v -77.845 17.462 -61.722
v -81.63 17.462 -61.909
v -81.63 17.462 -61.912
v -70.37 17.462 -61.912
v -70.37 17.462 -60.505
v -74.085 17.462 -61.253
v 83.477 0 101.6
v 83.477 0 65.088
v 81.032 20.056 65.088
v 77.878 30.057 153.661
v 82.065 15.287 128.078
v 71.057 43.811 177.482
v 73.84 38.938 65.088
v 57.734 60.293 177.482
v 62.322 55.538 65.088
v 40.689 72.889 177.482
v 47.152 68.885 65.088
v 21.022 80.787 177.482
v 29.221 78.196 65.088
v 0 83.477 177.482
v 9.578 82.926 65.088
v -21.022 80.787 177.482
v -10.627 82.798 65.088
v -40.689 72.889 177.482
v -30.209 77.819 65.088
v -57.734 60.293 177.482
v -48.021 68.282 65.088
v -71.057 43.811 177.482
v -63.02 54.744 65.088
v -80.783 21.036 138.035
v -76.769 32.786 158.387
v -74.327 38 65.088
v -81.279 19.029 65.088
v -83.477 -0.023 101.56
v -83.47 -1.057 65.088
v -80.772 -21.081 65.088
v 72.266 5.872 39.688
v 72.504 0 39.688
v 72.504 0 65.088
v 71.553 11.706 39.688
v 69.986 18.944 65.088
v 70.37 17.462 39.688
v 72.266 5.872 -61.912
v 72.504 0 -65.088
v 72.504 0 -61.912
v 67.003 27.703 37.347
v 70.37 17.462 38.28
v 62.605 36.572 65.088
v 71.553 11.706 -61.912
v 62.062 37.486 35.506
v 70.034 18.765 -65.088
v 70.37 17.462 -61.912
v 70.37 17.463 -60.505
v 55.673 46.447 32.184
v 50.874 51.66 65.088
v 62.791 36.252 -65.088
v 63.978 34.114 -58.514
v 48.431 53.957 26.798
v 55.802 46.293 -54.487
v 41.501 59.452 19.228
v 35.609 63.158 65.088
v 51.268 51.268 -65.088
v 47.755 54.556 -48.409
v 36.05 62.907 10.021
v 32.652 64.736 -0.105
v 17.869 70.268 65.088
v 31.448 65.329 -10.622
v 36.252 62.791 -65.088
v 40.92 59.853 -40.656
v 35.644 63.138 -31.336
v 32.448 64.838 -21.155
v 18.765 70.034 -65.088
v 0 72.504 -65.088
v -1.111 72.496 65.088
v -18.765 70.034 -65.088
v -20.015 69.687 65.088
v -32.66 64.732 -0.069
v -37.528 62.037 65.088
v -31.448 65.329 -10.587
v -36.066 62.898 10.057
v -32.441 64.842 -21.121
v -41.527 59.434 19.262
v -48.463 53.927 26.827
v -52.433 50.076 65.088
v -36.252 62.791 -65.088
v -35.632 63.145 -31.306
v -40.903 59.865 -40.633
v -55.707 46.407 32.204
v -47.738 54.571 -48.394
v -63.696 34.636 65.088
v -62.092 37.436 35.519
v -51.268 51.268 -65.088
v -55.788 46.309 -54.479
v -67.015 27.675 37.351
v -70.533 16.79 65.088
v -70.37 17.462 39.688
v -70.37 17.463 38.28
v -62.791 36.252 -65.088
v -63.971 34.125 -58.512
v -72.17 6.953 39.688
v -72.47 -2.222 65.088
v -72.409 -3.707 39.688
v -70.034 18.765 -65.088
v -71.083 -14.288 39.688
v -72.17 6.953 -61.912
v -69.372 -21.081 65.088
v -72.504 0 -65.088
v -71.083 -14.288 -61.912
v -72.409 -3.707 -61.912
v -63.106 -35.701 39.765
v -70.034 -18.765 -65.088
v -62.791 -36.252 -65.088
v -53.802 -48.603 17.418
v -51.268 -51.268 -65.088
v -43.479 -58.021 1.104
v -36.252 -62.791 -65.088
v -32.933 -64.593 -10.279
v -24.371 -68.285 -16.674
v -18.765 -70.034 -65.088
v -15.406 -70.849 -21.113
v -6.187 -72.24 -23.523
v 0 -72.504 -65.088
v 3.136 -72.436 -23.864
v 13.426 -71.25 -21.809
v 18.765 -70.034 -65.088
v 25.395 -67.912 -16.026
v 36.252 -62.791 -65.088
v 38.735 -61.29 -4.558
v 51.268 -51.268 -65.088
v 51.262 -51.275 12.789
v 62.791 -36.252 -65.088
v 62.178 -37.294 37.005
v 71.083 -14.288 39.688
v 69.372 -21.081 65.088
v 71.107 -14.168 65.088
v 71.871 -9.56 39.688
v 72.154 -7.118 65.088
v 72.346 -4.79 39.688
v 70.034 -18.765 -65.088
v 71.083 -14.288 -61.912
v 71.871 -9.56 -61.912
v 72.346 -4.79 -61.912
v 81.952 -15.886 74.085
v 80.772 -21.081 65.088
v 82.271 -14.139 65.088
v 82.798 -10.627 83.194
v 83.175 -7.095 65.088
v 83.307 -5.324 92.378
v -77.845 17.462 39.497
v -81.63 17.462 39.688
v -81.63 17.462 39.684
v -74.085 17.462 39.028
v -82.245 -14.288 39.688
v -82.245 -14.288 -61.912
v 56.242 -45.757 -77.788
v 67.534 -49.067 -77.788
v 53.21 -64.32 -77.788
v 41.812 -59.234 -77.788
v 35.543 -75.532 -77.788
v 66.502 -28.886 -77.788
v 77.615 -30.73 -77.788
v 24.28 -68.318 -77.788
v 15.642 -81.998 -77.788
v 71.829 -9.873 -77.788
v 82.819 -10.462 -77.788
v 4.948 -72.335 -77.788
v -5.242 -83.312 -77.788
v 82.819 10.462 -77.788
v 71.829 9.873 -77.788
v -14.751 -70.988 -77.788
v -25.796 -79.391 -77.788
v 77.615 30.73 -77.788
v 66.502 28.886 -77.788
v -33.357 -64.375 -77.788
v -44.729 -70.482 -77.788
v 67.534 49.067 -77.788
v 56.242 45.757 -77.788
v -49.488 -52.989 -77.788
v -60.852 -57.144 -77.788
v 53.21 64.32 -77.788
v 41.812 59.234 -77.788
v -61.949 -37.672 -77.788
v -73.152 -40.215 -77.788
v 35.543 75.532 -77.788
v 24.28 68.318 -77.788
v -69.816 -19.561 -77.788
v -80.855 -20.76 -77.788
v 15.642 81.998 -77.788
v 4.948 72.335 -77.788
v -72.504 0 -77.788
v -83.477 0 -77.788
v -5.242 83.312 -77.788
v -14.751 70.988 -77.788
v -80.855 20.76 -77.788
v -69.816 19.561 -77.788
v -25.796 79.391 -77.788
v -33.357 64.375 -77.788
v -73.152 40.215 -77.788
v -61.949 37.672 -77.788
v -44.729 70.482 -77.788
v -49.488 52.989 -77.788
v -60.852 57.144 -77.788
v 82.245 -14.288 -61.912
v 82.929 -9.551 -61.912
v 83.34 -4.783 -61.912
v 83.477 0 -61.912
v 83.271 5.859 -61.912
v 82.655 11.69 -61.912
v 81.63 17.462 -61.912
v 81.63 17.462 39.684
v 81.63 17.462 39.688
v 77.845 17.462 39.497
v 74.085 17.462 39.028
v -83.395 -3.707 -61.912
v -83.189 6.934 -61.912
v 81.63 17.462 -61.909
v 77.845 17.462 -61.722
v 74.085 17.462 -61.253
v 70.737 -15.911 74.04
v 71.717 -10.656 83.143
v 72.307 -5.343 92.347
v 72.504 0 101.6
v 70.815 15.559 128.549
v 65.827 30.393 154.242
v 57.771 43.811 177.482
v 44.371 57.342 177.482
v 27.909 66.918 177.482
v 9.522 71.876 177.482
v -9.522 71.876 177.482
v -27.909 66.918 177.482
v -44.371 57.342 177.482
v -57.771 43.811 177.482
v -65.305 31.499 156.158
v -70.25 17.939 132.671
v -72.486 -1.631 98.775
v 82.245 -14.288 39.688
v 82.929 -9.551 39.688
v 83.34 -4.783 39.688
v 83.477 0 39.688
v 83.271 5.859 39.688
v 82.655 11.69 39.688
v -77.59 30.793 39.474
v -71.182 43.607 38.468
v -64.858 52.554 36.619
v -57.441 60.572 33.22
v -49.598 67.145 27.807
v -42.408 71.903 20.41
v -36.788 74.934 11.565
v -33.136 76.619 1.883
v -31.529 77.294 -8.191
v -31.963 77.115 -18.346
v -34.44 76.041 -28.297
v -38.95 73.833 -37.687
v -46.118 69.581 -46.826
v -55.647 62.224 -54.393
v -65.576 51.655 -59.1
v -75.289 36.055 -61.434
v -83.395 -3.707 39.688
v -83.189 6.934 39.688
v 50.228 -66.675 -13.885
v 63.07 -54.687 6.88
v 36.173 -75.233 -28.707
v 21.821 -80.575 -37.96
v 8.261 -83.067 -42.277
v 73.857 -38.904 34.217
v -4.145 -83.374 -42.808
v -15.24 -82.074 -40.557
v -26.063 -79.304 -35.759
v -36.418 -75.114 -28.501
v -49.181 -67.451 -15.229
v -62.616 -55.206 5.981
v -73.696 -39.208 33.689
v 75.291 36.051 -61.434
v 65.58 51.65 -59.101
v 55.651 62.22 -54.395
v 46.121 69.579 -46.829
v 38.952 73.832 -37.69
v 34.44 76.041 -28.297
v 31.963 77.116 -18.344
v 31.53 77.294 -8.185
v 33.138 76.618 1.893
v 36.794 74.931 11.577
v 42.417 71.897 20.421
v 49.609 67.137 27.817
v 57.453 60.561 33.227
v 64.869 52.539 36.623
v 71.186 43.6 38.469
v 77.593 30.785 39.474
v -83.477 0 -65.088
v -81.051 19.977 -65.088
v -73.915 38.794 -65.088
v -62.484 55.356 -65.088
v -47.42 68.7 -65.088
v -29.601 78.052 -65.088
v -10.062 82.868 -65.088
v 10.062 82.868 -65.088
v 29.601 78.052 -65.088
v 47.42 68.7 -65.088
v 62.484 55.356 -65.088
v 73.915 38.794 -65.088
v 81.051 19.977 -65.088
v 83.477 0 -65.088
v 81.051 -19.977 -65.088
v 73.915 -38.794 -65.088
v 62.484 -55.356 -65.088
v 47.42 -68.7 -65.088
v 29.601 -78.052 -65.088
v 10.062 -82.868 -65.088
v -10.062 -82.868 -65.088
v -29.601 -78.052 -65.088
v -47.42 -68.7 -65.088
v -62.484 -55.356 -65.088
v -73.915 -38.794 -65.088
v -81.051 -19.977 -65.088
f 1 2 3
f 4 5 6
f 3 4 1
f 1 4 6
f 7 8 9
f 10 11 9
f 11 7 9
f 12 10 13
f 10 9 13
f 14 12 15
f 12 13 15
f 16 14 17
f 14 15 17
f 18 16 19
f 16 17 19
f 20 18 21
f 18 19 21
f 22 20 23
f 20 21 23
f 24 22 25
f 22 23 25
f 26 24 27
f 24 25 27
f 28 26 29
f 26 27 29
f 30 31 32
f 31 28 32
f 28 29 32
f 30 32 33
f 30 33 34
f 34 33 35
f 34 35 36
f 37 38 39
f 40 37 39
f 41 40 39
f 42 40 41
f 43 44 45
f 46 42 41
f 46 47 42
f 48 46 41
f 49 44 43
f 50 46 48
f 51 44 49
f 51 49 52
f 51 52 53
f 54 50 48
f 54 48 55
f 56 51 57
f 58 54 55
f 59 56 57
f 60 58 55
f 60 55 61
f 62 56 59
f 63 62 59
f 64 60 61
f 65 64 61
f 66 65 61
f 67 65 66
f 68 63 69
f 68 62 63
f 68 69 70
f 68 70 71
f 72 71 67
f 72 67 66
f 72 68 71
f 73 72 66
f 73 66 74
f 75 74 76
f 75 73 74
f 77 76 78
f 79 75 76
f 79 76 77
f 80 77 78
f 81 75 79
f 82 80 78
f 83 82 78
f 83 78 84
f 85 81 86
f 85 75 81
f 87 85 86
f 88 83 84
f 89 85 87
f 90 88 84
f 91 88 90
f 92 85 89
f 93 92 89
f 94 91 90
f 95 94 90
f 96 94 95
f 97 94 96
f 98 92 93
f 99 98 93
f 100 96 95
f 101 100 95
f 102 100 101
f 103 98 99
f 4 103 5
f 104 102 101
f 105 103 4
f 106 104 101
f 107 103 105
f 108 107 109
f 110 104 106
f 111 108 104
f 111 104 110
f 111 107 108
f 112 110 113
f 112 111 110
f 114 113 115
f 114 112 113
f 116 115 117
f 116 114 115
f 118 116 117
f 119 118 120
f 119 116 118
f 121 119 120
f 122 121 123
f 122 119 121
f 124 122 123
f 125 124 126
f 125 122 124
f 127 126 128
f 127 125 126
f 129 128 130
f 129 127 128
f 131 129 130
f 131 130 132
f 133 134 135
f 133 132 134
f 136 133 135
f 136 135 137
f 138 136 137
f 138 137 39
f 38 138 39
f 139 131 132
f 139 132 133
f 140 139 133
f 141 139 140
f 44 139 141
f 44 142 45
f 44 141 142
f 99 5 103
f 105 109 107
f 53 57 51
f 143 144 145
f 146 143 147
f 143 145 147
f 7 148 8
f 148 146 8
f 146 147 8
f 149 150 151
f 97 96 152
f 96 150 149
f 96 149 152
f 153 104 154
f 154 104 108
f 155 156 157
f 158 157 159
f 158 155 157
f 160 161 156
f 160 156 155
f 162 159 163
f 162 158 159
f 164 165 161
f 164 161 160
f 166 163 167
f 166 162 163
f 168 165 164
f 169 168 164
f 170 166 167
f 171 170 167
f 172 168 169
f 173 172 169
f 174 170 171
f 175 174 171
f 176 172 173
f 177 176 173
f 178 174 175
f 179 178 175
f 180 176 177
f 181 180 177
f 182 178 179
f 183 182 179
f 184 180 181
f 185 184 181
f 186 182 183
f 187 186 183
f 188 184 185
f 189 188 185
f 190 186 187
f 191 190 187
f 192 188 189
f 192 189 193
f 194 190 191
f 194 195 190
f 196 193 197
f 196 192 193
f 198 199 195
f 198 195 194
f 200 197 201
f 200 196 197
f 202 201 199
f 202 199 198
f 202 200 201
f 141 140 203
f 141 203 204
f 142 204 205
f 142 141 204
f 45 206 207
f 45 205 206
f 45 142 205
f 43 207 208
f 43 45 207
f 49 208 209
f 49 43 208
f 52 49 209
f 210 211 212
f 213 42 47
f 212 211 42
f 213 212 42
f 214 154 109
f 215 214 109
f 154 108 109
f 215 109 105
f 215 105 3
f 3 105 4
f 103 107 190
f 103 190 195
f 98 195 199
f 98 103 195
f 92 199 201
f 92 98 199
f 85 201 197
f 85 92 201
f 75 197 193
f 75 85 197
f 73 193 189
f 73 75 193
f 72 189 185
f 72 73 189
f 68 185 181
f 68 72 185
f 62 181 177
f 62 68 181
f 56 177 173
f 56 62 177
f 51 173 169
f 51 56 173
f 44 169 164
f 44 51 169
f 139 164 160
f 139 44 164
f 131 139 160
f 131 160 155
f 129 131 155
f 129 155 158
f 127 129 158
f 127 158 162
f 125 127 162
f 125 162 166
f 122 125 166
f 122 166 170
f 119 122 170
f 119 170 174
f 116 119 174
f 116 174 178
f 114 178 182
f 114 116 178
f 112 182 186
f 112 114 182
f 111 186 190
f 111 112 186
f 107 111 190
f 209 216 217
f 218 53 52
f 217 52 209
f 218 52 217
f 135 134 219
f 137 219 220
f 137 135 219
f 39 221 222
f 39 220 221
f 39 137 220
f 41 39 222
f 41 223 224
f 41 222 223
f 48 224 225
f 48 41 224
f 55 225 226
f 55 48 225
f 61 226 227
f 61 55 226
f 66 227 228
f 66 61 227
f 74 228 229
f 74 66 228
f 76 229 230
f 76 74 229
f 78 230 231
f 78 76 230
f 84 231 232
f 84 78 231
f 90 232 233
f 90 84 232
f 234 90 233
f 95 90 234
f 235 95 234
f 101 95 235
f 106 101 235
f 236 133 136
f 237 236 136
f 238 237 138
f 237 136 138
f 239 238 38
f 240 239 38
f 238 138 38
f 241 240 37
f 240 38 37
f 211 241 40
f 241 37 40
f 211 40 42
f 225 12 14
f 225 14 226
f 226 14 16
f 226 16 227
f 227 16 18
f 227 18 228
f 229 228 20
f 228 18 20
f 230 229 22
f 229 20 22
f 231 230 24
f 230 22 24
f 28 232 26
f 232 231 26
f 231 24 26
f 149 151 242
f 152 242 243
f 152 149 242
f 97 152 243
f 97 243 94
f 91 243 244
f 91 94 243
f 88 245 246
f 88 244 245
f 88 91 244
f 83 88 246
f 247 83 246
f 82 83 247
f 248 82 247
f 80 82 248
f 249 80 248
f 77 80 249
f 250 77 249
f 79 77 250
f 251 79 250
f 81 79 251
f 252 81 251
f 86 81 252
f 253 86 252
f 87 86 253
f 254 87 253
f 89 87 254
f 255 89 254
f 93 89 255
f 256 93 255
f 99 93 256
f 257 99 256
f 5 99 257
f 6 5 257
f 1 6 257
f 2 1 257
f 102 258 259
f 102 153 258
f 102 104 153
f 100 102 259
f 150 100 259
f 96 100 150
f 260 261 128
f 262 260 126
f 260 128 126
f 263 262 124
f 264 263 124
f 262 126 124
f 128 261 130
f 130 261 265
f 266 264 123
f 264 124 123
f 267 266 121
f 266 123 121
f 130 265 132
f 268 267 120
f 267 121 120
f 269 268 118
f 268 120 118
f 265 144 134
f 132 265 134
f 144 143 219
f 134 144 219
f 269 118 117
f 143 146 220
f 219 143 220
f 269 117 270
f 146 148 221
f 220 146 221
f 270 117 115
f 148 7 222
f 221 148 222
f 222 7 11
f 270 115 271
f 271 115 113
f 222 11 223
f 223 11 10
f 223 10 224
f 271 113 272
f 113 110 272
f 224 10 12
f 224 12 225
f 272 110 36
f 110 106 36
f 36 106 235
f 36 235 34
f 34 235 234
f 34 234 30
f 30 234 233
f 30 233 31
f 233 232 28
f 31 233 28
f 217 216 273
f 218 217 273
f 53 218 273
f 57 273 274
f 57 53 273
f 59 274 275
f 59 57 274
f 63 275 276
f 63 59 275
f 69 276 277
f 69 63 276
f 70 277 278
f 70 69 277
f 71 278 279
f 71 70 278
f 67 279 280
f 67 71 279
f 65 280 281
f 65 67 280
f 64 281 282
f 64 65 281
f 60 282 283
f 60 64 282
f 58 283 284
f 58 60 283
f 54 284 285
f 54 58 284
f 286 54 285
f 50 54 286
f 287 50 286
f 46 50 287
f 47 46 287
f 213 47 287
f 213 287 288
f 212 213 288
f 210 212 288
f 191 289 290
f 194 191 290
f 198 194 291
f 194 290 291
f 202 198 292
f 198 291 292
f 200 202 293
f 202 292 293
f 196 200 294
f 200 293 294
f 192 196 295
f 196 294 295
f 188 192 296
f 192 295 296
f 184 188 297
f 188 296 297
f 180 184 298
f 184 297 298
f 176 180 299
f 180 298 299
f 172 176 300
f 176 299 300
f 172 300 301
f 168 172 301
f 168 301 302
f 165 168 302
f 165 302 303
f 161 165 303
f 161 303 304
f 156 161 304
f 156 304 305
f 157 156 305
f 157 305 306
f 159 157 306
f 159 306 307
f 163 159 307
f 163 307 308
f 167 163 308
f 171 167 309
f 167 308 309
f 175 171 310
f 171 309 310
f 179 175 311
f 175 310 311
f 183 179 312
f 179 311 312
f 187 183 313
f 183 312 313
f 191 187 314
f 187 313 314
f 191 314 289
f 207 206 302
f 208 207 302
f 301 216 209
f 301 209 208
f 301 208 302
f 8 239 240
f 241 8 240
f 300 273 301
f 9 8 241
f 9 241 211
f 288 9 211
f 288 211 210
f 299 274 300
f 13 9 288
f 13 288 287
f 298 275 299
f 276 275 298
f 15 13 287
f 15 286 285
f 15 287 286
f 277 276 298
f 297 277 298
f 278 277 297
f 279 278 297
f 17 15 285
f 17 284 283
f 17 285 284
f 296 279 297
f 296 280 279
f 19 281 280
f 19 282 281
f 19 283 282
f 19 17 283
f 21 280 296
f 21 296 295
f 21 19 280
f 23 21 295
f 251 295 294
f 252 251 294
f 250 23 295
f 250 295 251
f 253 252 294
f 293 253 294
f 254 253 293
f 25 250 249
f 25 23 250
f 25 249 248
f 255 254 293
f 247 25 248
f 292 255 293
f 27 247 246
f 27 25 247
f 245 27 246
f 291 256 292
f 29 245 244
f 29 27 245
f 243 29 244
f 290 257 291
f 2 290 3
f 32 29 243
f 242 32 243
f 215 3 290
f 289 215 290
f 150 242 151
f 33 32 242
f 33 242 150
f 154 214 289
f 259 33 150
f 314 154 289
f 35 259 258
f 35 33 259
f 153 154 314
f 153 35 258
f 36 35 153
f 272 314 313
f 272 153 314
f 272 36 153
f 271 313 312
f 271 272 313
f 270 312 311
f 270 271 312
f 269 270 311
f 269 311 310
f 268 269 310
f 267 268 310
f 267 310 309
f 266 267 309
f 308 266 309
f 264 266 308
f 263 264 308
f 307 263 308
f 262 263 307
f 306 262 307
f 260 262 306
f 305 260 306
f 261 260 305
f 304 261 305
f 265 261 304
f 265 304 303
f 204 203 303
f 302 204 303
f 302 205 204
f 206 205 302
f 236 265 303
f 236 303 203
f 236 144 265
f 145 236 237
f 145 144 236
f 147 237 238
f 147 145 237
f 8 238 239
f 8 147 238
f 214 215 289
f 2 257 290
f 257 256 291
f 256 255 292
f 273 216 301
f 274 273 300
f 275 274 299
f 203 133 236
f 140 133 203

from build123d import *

# Parameters (mm, degrees)
SKETCH1_R               = 83.4771
SKETCH1_R_2             = 72.5043
BOSS_EXTRUDE1_DEPTH     = 65.0875
SKETCH3_W               = 101.6
SKETCH3_H               = 28.575
CUT_EXTRUDE2_DEPTH      = 84.4771
CUT_EXTRUDE2_DEPTH_BACK = 84.4771
SKETCH4_R               = 50.8
CUT_EXTRUDE3_DEPTH      = 98.7646
SKETCH6_W               = 101.6
SKETCH6_H               = 3.175
CUT_EXTRUDE4_DEPTH      = 84.4771001
CUT_EXTRUDE4_DEPTH_BACK = 84.4771001
SKETCH9_R               = 83.4771
SKETCH9_R_2             = 72.5043
BOSS_EXTRUDE2_DEPTH     = 508
SKETCH13_W              = 203.2
SKETCH13_H              = 2032
CUT_EXTRUDE7_DEPTH      = 762
SKETCH15_W              = 203.2
SKETCH15_H              = 203.2
CUT_EXTRUDE9_DEPTH      = 203.2
SKETCH16_R              = 83.4771
SKETCH16_R_2            = 72.5043
BOSS_EXTRUDE3_DEPTH     = 12.7


with BuildPart() as part:
    # Sketch1 → Boss-Extrude1 (new body, symmetric)
    with BuildSketch(Plane.XY):
        Circle(SKETCH1_R)
        Circle(SKETCH1_R_2, mode=Mode.SUBTRACT)
    extrude(amount=BOSS_EXTRUDE1_DEPTH, both=True)

    # Sketch3 → Cut-Extrude2 (cut, two sides)
    with BuildSketch(Plane(origin=(0, 0, 0), x_dir=(0, 0, -1), z_dir=(1, 0, 0))) as cut_extrude2_sk:
        with Locations((11.1125, 0)):
            Rectangle(SKETCH3_W, SKETCH3_H)
    extrude(amount=CUT_EXTRUDE2_DEPTH, mode=Mode.SUBTRACT)
    extrude(cut_extrude2_sk.sketch, amount=-CUT_EXTRUDE2_DEPTH_BACK, mode=Mode.SUBTRACT)

    # Sketch4 → Cut-Extrude3 (cut, through all)
    with BuildSketch(Plane(origin=(0, -14.2875, 0), x_dir=(1, 0, 0), z_dir=(0, 1, 0))):
        with Locations((-82.245325509, 11.1125)):
            Circle(SKETCH4_R)
        with Locations((82.245325509, 11.1125)):
            Circle(SKETCH4_R)
    extrude(amount=CUT_EXTRUDE3_DEPTH, mode=Mode.SUBTRACT)

    # Sketch6 → Cut-Extrude4 (cut, two sides)
    with BuildSketch(Plane(origin=(0, 0, 0), x_dir=(0, 0, -1), z_dir=(1, 0, 0))) as cut_extrude4_sk:
        with Locations((11.1125, 15.875)):
            Rectangle(SKETCH6_W, SKETCH6_H)
    extrude(amount=CUT_EXTRUDE4_DEPTH, mode=Mode.SUBTRACT)
    extrude(cut_extrude4_sk.sketch, amount=-CUT_EXTRUDE4_DEPTH_BACK, mode=Mode.SUBTRACT)

    # Sketch9 → Boss-Extrude2 (add)
    with BuildSketch(Plane.XY.offset(65.0875)):
        Circle(SKETCH9_R)
        Circle(SKETCH9_R_2, mode=Mode.SUBTRACT)
    extrude(amount=BOSS_EXTRUDE2_DEPTH)

    # Sketch13 → Cut-Extrude7 (cut)
    with BuildSketch(Plane(origin=(0, -43.994090512, 25.4), x_dir=(-1, 0, 0), z_dir=(0, 0.866025404, -0.5))):
        with Locations((0, 87.988181024)):
            Rectangle(SKETCH13_W, SKETCH13_H)
    extrude(amount=-CUT_EXTRUDE7_DEPTH, mode=Mode.SUBTRACT)

    # Sketch15 → Cut-Extrude9 (cut)
    with BuildSketch(Plane(origin=(0, 0, 177.4825), x_dir=(-1, 0, 0), z_dir=(0, 0, -1))):
        Rectangle(SKETCH15_W, SKETCH15_H)
    extrude(amount=-CUT_EXTRUDE9_DEPTH, mode=Mode.SUBTRACT)

    # Sketch16 → Boss-Extrude3 (add)
    with BuildSketch(Plane(origin=(0, 0, -65.0875), x_dir=(-1, 0, 0), z_dir=(0, 0, -1))):
        Circle(SKETCH16_R)
        Circle(SKETCH16_R_2, mode=Mode.SUBTRACT)
    extrude(amount=BOSS_EXTRUDE3_DEPTH)


solid = part.part
